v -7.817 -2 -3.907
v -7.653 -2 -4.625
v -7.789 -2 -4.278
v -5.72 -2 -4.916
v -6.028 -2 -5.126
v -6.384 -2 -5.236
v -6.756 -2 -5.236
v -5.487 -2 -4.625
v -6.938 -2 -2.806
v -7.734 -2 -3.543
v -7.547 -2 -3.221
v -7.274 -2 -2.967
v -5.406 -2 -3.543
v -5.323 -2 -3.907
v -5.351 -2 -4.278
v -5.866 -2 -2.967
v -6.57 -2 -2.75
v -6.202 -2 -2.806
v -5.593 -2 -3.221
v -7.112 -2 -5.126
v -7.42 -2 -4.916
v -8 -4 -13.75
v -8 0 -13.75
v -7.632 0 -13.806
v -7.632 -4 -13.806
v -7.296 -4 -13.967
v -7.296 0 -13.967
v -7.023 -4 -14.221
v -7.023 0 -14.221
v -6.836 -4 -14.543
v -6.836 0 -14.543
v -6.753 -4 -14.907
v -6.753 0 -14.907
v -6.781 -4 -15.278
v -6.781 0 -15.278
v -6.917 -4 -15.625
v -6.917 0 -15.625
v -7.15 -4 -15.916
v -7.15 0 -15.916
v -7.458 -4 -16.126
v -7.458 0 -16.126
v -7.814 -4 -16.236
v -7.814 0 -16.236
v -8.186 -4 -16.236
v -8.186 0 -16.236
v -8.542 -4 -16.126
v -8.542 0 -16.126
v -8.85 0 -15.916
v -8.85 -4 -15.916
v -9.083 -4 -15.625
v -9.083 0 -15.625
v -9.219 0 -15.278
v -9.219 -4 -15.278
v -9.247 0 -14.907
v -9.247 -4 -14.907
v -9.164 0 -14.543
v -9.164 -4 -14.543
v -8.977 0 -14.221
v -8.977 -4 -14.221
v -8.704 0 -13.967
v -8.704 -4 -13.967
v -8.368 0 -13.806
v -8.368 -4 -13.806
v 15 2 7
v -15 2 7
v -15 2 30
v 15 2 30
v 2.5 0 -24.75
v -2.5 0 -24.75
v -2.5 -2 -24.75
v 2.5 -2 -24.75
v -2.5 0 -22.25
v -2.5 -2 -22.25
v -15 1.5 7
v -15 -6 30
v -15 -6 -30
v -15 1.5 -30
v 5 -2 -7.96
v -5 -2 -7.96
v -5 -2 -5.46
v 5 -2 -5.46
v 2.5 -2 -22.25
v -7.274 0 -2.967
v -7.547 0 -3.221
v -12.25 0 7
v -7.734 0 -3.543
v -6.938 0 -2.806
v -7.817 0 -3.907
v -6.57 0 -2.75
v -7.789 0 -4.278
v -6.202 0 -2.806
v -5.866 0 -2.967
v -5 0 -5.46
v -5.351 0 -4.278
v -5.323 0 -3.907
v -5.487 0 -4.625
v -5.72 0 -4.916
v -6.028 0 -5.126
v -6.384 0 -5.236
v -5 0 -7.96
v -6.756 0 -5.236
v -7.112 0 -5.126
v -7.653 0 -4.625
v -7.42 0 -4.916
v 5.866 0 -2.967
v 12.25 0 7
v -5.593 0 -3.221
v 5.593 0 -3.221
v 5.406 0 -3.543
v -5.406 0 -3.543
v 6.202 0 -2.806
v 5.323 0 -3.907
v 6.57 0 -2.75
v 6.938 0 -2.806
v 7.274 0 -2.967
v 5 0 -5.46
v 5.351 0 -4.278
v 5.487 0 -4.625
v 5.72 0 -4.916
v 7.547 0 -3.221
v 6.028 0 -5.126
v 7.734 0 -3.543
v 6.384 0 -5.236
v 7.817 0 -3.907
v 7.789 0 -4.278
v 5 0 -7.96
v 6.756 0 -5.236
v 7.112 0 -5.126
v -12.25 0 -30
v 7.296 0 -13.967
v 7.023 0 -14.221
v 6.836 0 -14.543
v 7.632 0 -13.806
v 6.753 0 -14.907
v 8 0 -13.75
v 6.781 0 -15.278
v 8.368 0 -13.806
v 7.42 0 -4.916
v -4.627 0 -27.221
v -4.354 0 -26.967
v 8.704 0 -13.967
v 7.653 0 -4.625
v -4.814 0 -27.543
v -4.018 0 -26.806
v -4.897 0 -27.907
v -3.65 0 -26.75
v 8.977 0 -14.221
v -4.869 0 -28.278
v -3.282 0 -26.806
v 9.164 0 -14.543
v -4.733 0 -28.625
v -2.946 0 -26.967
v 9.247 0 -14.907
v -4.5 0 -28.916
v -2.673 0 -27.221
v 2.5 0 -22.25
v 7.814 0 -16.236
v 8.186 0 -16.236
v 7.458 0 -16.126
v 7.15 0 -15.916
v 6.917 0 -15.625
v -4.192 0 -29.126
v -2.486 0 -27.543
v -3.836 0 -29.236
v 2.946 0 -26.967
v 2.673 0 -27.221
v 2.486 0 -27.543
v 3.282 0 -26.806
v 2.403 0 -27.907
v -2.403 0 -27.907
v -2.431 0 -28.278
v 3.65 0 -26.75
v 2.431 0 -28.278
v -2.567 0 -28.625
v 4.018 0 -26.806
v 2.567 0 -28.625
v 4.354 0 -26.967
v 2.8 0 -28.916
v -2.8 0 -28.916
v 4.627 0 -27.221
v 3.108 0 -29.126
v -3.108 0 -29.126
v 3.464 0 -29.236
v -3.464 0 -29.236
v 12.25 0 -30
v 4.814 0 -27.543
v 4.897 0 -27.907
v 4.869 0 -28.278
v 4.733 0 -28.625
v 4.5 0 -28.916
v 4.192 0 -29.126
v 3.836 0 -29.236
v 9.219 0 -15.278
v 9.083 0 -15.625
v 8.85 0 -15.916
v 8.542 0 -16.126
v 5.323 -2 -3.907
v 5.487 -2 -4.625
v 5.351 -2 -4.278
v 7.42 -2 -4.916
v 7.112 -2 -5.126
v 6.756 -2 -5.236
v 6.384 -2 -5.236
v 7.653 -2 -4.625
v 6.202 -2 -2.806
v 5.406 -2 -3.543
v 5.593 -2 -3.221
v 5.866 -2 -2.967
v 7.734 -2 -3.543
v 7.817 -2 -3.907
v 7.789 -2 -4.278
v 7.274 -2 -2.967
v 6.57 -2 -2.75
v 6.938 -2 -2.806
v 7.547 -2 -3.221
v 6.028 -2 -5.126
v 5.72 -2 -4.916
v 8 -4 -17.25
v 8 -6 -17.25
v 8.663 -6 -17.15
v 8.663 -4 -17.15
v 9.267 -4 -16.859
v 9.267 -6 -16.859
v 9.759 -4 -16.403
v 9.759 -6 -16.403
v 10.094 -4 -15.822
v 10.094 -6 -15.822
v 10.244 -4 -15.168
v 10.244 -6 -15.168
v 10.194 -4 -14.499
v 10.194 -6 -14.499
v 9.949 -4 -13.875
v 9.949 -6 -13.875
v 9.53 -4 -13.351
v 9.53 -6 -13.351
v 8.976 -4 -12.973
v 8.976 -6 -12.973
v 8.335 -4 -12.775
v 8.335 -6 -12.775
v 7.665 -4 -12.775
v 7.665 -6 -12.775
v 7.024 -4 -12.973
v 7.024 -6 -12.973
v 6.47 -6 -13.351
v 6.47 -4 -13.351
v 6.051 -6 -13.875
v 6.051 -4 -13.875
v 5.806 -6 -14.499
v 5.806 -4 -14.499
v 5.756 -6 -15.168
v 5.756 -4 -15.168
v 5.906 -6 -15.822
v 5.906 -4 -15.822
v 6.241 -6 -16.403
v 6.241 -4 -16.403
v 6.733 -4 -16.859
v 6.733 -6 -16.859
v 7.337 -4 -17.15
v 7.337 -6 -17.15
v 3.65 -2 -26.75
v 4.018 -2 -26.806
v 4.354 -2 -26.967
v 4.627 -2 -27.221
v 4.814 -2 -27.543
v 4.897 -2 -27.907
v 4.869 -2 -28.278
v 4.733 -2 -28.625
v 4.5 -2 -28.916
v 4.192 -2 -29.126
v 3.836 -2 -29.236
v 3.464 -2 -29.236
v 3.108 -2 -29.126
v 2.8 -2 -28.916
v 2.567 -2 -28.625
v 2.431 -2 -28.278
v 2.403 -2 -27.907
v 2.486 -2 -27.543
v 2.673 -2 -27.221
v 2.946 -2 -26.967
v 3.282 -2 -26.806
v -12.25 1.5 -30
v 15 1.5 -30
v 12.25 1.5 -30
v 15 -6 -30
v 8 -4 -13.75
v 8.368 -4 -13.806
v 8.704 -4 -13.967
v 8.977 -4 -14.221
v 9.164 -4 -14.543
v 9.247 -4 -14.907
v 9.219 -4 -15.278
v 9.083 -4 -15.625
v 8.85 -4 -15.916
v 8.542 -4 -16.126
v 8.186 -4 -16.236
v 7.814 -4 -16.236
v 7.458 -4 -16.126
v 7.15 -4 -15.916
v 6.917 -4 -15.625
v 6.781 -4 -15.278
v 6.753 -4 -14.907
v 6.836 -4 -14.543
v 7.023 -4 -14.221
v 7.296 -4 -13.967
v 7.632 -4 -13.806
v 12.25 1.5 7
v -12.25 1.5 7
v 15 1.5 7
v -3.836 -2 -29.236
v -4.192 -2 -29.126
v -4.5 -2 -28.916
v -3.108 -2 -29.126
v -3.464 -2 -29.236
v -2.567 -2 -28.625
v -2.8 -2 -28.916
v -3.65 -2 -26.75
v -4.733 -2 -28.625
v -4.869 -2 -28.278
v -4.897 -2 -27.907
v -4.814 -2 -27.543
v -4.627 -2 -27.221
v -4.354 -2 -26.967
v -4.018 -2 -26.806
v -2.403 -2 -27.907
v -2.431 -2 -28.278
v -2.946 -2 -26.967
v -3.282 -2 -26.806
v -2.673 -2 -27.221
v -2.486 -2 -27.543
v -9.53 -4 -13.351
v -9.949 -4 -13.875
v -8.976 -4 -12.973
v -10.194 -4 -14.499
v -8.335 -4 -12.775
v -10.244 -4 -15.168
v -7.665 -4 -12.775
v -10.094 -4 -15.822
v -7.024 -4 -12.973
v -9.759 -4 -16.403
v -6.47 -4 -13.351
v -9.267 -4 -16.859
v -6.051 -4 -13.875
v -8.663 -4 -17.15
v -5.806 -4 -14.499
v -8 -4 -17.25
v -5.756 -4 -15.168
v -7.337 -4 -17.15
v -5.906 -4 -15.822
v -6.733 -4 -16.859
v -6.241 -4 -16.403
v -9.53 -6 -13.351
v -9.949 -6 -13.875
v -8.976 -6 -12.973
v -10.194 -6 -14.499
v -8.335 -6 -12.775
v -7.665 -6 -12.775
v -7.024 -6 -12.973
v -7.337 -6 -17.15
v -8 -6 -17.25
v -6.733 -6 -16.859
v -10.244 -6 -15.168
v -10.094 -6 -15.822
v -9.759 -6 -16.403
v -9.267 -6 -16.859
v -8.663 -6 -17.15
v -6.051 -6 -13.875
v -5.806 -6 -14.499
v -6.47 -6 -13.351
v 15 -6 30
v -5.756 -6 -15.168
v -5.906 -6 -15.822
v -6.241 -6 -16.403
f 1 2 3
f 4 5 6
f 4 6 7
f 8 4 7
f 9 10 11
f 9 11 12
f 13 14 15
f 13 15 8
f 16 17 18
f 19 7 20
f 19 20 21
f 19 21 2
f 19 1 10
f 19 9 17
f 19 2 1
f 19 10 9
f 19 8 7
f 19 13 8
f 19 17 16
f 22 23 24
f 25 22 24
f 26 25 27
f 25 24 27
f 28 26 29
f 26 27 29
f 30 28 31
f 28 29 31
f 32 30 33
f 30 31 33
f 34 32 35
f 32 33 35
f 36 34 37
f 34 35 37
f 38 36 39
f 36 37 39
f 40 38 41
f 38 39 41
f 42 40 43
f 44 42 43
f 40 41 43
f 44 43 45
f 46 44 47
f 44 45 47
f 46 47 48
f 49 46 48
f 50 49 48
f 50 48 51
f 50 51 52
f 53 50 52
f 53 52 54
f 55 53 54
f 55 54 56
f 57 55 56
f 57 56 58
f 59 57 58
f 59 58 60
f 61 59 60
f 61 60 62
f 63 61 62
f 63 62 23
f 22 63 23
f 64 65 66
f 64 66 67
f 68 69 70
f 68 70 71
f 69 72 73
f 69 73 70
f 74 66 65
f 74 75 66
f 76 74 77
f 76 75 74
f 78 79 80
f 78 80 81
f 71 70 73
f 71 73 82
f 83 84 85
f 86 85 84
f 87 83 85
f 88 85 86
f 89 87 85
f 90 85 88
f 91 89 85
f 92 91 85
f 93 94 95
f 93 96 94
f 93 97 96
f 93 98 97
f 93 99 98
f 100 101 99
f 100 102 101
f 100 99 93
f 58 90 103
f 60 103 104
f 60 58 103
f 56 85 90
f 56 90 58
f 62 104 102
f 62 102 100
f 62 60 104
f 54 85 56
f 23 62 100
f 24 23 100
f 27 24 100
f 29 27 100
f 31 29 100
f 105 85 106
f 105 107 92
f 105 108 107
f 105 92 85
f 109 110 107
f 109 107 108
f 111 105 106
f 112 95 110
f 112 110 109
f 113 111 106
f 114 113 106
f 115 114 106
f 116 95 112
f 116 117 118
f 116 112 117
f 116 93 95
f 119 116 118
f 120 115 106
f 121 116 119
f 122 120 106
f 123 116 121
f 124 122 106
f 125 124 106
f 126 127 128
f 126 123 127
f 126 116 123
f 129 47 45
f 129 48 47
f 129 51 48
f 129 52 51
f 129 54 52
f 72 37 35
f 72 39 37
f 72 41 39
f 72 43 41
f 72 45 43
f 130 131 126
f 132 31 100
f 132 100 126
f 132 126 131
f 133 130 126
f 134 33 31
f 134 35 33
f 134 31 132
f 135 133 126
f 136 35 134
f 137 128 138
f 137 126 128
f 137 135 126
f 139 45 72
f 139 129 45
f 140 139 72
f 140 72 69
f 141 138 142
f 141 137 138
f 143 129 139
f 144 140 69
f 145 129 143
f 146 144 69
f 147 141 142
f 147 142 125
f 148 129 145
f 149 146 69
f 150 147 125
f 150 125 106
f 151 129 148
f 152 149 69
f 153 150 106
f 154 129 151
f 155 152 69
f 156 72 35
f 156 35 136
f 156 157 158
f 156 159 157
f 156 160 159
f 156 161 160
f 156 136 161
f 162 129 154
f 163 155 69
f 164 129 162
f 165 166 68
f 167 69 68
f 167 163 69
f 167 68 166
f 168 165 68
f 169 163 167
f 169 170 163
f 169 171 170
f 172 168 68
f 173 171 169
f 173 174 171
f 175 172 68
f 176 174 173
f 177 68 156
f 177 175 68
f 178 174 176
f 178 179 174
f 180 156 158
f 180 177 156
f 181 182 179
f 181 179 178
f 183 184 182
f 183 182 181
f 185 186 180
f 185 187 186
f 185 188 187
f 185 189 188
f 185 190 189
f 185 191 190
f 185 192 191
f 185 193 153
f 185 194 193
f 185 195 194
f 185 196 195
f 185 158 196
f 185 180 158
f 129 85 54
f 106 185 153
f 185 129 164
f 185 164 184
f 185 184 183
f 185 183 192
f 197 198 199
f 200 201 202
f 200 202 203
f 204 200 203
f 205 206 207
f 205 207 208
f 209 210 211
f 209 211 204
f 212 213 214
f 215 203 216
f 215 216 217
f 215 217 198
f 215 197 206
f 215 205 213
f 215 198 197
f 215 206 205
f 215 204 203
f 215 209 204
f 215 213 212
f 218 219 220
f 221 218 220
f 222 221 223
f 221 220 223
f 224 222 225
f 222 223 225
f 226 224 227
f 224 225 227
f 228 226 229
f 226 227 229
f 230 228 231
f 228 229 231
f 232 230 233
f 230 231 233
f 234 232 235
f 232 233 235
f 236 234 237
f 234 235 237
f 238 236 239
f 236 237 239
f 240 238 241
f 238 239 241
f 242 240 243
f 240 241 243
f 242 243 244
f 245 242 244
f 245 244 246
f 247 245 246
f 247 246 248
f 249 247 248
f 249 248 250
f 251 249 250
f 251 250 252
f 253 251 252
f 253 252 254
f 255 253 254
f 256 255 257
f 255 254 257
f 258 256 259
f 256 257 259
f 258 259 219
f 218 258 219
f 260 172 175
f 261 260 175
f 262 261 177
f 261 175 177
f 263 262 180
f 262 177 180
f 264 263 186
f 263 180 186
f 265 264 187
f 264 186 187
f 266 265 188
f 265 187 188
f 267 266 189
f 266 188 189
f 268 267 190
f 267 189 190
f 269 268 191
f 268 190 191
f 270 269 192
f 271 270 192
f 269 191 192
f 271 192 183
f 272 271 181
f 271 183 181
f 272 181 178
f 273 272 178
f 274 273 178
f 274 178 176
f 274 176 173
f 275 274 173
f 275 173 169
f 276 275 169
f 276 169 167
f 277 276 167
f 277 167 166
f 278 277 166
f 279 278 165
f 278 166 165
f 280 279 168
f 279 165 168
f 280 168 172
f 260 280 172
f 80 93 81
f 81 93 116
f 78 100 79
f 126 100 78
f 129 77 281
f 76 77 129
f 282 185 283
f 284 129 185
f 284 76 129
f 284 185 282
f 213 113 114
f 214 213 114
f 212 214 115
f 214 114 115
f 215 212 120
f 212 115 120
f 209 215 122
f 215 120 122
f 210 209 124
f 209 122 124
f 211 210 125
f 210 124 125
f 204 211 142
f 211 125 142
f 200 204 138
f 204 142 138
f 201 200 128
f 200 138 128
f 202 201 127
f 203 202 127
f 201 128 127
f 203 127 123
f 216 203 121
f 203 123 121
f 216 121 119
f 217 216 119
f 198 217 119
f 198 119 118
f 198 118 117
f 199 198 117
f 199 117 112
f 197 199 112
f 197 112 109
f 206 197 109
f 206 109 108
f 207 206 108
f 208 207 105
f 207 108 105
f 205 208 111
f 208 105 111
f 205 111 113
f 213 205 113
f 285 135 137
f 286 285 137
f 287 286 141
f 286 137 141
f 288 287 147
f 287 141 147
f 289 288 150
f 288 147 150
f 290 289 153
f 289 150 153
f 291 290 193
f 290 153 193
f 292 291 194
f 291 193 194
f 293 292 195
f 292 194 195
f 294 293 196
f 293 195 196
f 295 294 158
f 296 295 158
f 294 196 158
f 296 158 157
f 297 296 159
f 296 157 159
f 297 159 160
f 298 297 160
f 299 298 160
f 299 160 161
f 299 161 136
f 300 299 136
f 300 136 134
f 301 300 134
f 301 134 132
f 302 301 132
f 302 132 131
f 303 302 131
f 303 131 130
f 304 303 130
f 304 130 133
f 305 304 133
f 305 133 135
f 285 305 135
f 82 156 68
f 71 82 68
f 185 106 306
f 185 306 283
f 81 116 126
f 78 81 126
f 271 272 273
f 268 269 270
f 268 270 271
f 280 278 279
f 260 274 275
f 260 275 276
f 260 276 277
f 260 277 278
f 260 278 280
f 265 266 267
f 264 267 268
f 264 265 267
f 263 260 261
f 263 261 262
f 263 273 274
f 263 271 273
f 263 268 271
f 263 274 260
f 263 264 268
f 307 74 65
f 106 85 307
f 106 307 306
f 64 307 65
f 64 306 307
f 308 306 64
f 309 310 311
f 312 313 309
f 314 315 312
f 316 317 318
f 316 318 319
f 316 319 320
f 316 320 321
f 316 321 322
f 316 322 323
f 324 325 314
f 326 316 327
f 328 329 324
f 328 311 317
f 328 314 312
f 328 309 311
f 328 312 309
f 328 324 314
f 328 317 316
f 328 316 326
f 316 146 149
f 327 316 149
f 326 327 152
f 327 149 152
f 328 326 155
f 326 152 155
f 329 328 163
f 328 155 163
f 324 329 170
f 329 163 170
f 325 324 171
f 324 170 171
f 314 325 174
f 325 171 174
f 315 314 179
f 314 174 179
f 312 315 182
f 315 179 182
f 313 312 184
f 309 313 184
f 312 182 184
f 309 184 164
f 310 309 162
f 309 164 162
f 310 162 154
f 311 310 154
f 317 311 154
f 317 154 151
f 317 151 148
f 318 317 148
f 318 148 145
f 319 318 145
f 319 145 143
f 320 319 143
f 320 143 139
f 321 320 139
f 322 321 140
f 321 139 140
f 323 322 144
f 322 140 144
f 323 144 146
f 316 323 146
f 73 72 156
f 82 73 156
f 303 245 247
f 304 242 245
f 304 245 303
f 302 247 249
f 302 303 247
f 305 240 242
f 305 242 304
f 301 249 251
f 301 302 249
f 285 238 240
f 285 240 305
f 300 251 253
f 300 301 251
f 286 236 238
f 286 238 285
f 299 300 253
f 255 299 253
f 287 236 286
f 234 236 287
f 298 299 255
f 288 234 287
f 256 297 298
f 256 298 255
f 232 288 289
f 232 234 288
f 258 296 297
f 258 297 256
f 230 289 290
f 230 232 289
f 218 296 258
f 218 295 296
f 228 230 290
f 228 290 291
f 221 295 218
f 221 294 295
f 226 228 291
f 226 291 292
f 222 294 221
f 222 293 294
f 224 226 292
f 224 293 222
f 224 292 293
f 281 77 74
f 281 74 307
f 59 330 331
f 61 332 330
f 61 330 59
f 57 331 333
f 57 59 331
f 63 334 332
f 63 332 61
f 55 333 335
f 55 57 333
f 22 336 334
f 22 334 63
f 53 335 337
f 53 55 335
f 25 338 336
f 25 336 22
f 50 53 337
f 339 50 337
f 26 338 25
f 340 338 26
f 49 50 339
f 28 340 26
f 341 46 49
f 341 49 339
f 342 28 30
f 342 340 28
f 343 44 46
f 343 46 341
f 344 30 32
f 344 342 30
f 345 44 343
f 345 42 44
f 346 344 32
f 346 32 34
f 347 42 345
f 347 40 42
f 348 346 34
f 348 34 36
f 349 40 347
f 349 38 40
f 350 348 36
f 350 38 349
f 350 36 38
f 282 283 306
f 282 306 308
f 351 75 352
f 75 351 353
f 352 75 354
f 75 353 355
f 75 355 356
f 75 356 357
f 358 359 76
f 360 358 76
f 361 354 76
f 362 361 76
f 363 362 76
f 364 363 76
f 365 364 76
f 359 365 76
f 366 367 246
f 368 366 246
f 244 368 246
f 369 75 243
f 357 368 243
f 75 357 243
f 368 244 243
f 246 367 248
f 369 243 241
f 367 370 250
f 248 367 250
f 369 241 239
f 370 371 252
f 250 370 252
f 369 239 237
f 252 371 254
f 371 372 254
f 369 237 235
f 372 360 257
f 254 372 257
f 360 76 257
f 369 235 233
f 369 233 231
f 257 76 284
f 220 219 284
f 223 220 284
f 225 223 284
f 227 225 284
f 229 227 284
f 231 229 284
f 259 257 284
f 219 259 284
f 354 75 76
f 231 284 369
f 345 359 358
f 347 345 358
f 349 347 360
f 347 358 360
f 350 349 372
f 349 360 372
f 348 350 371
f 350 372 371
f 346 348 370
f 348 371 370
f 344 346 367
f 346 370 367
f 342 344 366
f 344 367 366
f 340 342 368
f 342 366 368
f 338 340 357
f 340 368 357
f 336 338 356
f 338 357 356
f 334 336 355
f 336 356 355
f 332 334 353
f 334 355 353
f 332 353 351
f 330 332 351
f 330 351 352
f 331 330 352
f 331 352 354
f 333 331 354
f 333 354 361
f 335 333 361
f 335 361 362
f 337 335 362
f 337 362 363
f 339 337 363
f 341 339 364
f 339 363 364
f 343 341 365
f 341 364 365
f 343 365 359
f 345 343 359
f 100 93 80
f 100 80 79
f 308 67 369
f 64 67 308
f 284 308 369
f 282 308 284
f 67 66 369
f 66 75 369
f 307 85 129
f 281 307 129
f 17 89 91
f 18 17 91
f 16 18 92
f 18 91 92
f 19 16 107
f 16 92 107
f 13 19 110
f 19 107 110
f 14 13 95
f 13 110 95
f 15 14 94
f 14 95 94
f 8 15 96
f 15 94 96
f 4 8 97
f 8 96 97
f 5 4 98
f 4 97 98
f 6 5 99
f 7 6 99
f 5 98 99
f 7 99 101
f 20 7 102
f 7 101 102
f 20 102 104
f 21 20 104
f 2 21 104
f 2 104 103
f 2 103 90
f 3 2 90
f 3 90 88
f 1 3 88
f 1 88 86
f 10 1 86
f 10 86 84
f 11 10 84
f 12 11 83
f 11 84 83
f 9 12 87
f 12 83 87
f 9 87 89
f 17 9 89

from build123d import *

# Parameters (mm, degrees)
SKETCH1_W           = 30
SKETCH1_H           = 60
SKETCH1_R           = 1.25
BOSS_EXTRUDE1_DEPTH = 6
SKETCH2_R           = 2.25
CUT_EXTRUDE1_DEPTH  = 2
SKETCH3_W           = 2.75
SKETCH3_H           = 60
BOSS_EXTRUDE2_DEPTH = 1.5
SKETCH4_R           = 1.25
SKETCH4_W           = 5
SKETCH4_H           = 2.5
SKETCH4_W_2         = 10
CUT_EXTRUDE2_DEPTH  = 2
SKETCH5_W           = 30
SKETCH5_H           = 23
BOSS_EXTRUDE3_DEPTH = 2


with BuildPart() as part:
    # Sketch1 → Boss-Extrude1 (new body)
    with BuildSketch(Plane(origin=(0, 0, 0), x_dir=(1, 0, 0), z_dir=(0, 1, 0))):
        Rectangle(SKETCH1_W, SKETCH1_H)
        with Locations(Location((-8, 15, 0), (0, 0, 270))):
            Circle(SKETCH1_R, mode=Mode.SUBTRACT)
        with Locations(Location((8, 15, 0), (0, 0, 270))):
            Circle(SKETCH1_R, mode=Mode.SUBTRACT)
    extrude(amount=-BOSS_EXTRUDE1_DEPTH)

    # Sketch2 → Cut-Extrude1 (cut)
    with BuildSketch(Plane(origin=(0, -6, 0), x_dir=(-1, 0, 0), z_dir=(0, -1, 0))):
        with Locations(Location((-8, 15, 0), (0, 0, 90))):
            Circle(SKETCH2_R)
        with Locations(Location((8, 15, 0), (0, 0, 90))):
            Circle(SKETCH2_R)
    extrude(amount=-CUT_EXTRUDE1_DEPTH, mode=Mode.SUBTRACT)

    # Sketch3 → Boss-Extrude2 (add)
    with BuildSketch(Plane(origin=(0, 0, 0), x_dir=(1, 0, 0), z_dir=(0, 1, 0))):
        with Locations((-13.625, 0)):
            Rectangle(SKETCH3_W, SKETCH3_H)
        with Locations((13.625, 0)):
            Rectangle(SKETCH3_W, SKETCH3_H)
    extrude(amount=BOSS_EXTRUDE2_DEPTH)

    # Sketch4 → Cut-Extrude2 (cut)
    with BuildSketch(Plane(origin=(0, 0, 0), x_dir=(1, 0, 0), z_dir=(0, 1, 0))):
        with Locations(Location((-3.65, 28, 0), (0, 0, 270))):
            Circle(SKETCH4_R)
        with Locations(Location((3.65, 28, 0), (0, 0, 270))):
            Circle(SKETCH4_R)
        with Locations(Location((-6.57, 4, 0), (0, 0, 270))):
            Circle(SKETCH4_R)
        with Locations(Location((6.57, 4, 0), (0, 0, 270))):
            Circle(SKETCH4_R)
        with Locations((0, 23.5)):
            Rectangle(SKETCH4_W, SKETCH4_H)
        with Locations((0, 6.71)):
            Rectangle(SKETCH4_W_2, SKETCH4_H)
    extrude(amount=-CUT_EXTRUDE2_DEPTH, mode=Mode.SUBTRACT)

    # Sketch5 → Boss-Extrude3 (add)
    with BuildSketch(Plane(origin=(0, 0, 0), x_dir=(1, 0, 0), z_dir=(0, 1, 0))):
        with Locations((0, -18.5)):
            Rectangle(SKETCH5_W, SKETCH5_H)
    extrude(amount=BOSS_EXTRUDE3_DEPTH)


solid = part.part
